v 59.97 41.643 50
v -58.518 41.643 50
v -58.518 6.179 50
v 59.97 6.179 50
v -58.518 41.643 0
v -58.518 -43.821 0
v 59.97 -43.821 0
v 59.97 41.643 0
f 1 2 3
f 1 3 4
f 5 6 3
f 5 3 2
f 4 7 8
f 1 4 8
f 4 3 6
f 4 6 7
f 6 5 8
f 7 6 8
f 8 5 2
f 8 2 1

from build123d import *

# Parameters (mm, degrees)
F0_W     = 118.4879094362
F0_H     = 85.4637138546
F1_DEPTH = 50
F2_SIZE  = 49.99999


# Not quite as in the source:
# - a fillet or chamfer is up to 0.001 mm smaller than in the source, because OpenCascade refuses the exact size


with BuildPart() as f1:
    # F0 (on Top) → F1 (new body)
    with BuildSketch(Plane.XY):
        with Locations((0.7258094847, -1.0887105018)):
            Rectangle(F0_W, F0_H)
    extrude(amount=F1_DEPTH)

    # F2 (size 50 in the source; OpenCascade refuses exactly that, so slightly less here)
    f2_edges = [f1.edges().sort_by_distance(p)[0] for p in [
        (0.725809, -43.820567, 50),
    ]]
    chamfer(f2_edges, length=F2_SIZE)


solid = f1.part
